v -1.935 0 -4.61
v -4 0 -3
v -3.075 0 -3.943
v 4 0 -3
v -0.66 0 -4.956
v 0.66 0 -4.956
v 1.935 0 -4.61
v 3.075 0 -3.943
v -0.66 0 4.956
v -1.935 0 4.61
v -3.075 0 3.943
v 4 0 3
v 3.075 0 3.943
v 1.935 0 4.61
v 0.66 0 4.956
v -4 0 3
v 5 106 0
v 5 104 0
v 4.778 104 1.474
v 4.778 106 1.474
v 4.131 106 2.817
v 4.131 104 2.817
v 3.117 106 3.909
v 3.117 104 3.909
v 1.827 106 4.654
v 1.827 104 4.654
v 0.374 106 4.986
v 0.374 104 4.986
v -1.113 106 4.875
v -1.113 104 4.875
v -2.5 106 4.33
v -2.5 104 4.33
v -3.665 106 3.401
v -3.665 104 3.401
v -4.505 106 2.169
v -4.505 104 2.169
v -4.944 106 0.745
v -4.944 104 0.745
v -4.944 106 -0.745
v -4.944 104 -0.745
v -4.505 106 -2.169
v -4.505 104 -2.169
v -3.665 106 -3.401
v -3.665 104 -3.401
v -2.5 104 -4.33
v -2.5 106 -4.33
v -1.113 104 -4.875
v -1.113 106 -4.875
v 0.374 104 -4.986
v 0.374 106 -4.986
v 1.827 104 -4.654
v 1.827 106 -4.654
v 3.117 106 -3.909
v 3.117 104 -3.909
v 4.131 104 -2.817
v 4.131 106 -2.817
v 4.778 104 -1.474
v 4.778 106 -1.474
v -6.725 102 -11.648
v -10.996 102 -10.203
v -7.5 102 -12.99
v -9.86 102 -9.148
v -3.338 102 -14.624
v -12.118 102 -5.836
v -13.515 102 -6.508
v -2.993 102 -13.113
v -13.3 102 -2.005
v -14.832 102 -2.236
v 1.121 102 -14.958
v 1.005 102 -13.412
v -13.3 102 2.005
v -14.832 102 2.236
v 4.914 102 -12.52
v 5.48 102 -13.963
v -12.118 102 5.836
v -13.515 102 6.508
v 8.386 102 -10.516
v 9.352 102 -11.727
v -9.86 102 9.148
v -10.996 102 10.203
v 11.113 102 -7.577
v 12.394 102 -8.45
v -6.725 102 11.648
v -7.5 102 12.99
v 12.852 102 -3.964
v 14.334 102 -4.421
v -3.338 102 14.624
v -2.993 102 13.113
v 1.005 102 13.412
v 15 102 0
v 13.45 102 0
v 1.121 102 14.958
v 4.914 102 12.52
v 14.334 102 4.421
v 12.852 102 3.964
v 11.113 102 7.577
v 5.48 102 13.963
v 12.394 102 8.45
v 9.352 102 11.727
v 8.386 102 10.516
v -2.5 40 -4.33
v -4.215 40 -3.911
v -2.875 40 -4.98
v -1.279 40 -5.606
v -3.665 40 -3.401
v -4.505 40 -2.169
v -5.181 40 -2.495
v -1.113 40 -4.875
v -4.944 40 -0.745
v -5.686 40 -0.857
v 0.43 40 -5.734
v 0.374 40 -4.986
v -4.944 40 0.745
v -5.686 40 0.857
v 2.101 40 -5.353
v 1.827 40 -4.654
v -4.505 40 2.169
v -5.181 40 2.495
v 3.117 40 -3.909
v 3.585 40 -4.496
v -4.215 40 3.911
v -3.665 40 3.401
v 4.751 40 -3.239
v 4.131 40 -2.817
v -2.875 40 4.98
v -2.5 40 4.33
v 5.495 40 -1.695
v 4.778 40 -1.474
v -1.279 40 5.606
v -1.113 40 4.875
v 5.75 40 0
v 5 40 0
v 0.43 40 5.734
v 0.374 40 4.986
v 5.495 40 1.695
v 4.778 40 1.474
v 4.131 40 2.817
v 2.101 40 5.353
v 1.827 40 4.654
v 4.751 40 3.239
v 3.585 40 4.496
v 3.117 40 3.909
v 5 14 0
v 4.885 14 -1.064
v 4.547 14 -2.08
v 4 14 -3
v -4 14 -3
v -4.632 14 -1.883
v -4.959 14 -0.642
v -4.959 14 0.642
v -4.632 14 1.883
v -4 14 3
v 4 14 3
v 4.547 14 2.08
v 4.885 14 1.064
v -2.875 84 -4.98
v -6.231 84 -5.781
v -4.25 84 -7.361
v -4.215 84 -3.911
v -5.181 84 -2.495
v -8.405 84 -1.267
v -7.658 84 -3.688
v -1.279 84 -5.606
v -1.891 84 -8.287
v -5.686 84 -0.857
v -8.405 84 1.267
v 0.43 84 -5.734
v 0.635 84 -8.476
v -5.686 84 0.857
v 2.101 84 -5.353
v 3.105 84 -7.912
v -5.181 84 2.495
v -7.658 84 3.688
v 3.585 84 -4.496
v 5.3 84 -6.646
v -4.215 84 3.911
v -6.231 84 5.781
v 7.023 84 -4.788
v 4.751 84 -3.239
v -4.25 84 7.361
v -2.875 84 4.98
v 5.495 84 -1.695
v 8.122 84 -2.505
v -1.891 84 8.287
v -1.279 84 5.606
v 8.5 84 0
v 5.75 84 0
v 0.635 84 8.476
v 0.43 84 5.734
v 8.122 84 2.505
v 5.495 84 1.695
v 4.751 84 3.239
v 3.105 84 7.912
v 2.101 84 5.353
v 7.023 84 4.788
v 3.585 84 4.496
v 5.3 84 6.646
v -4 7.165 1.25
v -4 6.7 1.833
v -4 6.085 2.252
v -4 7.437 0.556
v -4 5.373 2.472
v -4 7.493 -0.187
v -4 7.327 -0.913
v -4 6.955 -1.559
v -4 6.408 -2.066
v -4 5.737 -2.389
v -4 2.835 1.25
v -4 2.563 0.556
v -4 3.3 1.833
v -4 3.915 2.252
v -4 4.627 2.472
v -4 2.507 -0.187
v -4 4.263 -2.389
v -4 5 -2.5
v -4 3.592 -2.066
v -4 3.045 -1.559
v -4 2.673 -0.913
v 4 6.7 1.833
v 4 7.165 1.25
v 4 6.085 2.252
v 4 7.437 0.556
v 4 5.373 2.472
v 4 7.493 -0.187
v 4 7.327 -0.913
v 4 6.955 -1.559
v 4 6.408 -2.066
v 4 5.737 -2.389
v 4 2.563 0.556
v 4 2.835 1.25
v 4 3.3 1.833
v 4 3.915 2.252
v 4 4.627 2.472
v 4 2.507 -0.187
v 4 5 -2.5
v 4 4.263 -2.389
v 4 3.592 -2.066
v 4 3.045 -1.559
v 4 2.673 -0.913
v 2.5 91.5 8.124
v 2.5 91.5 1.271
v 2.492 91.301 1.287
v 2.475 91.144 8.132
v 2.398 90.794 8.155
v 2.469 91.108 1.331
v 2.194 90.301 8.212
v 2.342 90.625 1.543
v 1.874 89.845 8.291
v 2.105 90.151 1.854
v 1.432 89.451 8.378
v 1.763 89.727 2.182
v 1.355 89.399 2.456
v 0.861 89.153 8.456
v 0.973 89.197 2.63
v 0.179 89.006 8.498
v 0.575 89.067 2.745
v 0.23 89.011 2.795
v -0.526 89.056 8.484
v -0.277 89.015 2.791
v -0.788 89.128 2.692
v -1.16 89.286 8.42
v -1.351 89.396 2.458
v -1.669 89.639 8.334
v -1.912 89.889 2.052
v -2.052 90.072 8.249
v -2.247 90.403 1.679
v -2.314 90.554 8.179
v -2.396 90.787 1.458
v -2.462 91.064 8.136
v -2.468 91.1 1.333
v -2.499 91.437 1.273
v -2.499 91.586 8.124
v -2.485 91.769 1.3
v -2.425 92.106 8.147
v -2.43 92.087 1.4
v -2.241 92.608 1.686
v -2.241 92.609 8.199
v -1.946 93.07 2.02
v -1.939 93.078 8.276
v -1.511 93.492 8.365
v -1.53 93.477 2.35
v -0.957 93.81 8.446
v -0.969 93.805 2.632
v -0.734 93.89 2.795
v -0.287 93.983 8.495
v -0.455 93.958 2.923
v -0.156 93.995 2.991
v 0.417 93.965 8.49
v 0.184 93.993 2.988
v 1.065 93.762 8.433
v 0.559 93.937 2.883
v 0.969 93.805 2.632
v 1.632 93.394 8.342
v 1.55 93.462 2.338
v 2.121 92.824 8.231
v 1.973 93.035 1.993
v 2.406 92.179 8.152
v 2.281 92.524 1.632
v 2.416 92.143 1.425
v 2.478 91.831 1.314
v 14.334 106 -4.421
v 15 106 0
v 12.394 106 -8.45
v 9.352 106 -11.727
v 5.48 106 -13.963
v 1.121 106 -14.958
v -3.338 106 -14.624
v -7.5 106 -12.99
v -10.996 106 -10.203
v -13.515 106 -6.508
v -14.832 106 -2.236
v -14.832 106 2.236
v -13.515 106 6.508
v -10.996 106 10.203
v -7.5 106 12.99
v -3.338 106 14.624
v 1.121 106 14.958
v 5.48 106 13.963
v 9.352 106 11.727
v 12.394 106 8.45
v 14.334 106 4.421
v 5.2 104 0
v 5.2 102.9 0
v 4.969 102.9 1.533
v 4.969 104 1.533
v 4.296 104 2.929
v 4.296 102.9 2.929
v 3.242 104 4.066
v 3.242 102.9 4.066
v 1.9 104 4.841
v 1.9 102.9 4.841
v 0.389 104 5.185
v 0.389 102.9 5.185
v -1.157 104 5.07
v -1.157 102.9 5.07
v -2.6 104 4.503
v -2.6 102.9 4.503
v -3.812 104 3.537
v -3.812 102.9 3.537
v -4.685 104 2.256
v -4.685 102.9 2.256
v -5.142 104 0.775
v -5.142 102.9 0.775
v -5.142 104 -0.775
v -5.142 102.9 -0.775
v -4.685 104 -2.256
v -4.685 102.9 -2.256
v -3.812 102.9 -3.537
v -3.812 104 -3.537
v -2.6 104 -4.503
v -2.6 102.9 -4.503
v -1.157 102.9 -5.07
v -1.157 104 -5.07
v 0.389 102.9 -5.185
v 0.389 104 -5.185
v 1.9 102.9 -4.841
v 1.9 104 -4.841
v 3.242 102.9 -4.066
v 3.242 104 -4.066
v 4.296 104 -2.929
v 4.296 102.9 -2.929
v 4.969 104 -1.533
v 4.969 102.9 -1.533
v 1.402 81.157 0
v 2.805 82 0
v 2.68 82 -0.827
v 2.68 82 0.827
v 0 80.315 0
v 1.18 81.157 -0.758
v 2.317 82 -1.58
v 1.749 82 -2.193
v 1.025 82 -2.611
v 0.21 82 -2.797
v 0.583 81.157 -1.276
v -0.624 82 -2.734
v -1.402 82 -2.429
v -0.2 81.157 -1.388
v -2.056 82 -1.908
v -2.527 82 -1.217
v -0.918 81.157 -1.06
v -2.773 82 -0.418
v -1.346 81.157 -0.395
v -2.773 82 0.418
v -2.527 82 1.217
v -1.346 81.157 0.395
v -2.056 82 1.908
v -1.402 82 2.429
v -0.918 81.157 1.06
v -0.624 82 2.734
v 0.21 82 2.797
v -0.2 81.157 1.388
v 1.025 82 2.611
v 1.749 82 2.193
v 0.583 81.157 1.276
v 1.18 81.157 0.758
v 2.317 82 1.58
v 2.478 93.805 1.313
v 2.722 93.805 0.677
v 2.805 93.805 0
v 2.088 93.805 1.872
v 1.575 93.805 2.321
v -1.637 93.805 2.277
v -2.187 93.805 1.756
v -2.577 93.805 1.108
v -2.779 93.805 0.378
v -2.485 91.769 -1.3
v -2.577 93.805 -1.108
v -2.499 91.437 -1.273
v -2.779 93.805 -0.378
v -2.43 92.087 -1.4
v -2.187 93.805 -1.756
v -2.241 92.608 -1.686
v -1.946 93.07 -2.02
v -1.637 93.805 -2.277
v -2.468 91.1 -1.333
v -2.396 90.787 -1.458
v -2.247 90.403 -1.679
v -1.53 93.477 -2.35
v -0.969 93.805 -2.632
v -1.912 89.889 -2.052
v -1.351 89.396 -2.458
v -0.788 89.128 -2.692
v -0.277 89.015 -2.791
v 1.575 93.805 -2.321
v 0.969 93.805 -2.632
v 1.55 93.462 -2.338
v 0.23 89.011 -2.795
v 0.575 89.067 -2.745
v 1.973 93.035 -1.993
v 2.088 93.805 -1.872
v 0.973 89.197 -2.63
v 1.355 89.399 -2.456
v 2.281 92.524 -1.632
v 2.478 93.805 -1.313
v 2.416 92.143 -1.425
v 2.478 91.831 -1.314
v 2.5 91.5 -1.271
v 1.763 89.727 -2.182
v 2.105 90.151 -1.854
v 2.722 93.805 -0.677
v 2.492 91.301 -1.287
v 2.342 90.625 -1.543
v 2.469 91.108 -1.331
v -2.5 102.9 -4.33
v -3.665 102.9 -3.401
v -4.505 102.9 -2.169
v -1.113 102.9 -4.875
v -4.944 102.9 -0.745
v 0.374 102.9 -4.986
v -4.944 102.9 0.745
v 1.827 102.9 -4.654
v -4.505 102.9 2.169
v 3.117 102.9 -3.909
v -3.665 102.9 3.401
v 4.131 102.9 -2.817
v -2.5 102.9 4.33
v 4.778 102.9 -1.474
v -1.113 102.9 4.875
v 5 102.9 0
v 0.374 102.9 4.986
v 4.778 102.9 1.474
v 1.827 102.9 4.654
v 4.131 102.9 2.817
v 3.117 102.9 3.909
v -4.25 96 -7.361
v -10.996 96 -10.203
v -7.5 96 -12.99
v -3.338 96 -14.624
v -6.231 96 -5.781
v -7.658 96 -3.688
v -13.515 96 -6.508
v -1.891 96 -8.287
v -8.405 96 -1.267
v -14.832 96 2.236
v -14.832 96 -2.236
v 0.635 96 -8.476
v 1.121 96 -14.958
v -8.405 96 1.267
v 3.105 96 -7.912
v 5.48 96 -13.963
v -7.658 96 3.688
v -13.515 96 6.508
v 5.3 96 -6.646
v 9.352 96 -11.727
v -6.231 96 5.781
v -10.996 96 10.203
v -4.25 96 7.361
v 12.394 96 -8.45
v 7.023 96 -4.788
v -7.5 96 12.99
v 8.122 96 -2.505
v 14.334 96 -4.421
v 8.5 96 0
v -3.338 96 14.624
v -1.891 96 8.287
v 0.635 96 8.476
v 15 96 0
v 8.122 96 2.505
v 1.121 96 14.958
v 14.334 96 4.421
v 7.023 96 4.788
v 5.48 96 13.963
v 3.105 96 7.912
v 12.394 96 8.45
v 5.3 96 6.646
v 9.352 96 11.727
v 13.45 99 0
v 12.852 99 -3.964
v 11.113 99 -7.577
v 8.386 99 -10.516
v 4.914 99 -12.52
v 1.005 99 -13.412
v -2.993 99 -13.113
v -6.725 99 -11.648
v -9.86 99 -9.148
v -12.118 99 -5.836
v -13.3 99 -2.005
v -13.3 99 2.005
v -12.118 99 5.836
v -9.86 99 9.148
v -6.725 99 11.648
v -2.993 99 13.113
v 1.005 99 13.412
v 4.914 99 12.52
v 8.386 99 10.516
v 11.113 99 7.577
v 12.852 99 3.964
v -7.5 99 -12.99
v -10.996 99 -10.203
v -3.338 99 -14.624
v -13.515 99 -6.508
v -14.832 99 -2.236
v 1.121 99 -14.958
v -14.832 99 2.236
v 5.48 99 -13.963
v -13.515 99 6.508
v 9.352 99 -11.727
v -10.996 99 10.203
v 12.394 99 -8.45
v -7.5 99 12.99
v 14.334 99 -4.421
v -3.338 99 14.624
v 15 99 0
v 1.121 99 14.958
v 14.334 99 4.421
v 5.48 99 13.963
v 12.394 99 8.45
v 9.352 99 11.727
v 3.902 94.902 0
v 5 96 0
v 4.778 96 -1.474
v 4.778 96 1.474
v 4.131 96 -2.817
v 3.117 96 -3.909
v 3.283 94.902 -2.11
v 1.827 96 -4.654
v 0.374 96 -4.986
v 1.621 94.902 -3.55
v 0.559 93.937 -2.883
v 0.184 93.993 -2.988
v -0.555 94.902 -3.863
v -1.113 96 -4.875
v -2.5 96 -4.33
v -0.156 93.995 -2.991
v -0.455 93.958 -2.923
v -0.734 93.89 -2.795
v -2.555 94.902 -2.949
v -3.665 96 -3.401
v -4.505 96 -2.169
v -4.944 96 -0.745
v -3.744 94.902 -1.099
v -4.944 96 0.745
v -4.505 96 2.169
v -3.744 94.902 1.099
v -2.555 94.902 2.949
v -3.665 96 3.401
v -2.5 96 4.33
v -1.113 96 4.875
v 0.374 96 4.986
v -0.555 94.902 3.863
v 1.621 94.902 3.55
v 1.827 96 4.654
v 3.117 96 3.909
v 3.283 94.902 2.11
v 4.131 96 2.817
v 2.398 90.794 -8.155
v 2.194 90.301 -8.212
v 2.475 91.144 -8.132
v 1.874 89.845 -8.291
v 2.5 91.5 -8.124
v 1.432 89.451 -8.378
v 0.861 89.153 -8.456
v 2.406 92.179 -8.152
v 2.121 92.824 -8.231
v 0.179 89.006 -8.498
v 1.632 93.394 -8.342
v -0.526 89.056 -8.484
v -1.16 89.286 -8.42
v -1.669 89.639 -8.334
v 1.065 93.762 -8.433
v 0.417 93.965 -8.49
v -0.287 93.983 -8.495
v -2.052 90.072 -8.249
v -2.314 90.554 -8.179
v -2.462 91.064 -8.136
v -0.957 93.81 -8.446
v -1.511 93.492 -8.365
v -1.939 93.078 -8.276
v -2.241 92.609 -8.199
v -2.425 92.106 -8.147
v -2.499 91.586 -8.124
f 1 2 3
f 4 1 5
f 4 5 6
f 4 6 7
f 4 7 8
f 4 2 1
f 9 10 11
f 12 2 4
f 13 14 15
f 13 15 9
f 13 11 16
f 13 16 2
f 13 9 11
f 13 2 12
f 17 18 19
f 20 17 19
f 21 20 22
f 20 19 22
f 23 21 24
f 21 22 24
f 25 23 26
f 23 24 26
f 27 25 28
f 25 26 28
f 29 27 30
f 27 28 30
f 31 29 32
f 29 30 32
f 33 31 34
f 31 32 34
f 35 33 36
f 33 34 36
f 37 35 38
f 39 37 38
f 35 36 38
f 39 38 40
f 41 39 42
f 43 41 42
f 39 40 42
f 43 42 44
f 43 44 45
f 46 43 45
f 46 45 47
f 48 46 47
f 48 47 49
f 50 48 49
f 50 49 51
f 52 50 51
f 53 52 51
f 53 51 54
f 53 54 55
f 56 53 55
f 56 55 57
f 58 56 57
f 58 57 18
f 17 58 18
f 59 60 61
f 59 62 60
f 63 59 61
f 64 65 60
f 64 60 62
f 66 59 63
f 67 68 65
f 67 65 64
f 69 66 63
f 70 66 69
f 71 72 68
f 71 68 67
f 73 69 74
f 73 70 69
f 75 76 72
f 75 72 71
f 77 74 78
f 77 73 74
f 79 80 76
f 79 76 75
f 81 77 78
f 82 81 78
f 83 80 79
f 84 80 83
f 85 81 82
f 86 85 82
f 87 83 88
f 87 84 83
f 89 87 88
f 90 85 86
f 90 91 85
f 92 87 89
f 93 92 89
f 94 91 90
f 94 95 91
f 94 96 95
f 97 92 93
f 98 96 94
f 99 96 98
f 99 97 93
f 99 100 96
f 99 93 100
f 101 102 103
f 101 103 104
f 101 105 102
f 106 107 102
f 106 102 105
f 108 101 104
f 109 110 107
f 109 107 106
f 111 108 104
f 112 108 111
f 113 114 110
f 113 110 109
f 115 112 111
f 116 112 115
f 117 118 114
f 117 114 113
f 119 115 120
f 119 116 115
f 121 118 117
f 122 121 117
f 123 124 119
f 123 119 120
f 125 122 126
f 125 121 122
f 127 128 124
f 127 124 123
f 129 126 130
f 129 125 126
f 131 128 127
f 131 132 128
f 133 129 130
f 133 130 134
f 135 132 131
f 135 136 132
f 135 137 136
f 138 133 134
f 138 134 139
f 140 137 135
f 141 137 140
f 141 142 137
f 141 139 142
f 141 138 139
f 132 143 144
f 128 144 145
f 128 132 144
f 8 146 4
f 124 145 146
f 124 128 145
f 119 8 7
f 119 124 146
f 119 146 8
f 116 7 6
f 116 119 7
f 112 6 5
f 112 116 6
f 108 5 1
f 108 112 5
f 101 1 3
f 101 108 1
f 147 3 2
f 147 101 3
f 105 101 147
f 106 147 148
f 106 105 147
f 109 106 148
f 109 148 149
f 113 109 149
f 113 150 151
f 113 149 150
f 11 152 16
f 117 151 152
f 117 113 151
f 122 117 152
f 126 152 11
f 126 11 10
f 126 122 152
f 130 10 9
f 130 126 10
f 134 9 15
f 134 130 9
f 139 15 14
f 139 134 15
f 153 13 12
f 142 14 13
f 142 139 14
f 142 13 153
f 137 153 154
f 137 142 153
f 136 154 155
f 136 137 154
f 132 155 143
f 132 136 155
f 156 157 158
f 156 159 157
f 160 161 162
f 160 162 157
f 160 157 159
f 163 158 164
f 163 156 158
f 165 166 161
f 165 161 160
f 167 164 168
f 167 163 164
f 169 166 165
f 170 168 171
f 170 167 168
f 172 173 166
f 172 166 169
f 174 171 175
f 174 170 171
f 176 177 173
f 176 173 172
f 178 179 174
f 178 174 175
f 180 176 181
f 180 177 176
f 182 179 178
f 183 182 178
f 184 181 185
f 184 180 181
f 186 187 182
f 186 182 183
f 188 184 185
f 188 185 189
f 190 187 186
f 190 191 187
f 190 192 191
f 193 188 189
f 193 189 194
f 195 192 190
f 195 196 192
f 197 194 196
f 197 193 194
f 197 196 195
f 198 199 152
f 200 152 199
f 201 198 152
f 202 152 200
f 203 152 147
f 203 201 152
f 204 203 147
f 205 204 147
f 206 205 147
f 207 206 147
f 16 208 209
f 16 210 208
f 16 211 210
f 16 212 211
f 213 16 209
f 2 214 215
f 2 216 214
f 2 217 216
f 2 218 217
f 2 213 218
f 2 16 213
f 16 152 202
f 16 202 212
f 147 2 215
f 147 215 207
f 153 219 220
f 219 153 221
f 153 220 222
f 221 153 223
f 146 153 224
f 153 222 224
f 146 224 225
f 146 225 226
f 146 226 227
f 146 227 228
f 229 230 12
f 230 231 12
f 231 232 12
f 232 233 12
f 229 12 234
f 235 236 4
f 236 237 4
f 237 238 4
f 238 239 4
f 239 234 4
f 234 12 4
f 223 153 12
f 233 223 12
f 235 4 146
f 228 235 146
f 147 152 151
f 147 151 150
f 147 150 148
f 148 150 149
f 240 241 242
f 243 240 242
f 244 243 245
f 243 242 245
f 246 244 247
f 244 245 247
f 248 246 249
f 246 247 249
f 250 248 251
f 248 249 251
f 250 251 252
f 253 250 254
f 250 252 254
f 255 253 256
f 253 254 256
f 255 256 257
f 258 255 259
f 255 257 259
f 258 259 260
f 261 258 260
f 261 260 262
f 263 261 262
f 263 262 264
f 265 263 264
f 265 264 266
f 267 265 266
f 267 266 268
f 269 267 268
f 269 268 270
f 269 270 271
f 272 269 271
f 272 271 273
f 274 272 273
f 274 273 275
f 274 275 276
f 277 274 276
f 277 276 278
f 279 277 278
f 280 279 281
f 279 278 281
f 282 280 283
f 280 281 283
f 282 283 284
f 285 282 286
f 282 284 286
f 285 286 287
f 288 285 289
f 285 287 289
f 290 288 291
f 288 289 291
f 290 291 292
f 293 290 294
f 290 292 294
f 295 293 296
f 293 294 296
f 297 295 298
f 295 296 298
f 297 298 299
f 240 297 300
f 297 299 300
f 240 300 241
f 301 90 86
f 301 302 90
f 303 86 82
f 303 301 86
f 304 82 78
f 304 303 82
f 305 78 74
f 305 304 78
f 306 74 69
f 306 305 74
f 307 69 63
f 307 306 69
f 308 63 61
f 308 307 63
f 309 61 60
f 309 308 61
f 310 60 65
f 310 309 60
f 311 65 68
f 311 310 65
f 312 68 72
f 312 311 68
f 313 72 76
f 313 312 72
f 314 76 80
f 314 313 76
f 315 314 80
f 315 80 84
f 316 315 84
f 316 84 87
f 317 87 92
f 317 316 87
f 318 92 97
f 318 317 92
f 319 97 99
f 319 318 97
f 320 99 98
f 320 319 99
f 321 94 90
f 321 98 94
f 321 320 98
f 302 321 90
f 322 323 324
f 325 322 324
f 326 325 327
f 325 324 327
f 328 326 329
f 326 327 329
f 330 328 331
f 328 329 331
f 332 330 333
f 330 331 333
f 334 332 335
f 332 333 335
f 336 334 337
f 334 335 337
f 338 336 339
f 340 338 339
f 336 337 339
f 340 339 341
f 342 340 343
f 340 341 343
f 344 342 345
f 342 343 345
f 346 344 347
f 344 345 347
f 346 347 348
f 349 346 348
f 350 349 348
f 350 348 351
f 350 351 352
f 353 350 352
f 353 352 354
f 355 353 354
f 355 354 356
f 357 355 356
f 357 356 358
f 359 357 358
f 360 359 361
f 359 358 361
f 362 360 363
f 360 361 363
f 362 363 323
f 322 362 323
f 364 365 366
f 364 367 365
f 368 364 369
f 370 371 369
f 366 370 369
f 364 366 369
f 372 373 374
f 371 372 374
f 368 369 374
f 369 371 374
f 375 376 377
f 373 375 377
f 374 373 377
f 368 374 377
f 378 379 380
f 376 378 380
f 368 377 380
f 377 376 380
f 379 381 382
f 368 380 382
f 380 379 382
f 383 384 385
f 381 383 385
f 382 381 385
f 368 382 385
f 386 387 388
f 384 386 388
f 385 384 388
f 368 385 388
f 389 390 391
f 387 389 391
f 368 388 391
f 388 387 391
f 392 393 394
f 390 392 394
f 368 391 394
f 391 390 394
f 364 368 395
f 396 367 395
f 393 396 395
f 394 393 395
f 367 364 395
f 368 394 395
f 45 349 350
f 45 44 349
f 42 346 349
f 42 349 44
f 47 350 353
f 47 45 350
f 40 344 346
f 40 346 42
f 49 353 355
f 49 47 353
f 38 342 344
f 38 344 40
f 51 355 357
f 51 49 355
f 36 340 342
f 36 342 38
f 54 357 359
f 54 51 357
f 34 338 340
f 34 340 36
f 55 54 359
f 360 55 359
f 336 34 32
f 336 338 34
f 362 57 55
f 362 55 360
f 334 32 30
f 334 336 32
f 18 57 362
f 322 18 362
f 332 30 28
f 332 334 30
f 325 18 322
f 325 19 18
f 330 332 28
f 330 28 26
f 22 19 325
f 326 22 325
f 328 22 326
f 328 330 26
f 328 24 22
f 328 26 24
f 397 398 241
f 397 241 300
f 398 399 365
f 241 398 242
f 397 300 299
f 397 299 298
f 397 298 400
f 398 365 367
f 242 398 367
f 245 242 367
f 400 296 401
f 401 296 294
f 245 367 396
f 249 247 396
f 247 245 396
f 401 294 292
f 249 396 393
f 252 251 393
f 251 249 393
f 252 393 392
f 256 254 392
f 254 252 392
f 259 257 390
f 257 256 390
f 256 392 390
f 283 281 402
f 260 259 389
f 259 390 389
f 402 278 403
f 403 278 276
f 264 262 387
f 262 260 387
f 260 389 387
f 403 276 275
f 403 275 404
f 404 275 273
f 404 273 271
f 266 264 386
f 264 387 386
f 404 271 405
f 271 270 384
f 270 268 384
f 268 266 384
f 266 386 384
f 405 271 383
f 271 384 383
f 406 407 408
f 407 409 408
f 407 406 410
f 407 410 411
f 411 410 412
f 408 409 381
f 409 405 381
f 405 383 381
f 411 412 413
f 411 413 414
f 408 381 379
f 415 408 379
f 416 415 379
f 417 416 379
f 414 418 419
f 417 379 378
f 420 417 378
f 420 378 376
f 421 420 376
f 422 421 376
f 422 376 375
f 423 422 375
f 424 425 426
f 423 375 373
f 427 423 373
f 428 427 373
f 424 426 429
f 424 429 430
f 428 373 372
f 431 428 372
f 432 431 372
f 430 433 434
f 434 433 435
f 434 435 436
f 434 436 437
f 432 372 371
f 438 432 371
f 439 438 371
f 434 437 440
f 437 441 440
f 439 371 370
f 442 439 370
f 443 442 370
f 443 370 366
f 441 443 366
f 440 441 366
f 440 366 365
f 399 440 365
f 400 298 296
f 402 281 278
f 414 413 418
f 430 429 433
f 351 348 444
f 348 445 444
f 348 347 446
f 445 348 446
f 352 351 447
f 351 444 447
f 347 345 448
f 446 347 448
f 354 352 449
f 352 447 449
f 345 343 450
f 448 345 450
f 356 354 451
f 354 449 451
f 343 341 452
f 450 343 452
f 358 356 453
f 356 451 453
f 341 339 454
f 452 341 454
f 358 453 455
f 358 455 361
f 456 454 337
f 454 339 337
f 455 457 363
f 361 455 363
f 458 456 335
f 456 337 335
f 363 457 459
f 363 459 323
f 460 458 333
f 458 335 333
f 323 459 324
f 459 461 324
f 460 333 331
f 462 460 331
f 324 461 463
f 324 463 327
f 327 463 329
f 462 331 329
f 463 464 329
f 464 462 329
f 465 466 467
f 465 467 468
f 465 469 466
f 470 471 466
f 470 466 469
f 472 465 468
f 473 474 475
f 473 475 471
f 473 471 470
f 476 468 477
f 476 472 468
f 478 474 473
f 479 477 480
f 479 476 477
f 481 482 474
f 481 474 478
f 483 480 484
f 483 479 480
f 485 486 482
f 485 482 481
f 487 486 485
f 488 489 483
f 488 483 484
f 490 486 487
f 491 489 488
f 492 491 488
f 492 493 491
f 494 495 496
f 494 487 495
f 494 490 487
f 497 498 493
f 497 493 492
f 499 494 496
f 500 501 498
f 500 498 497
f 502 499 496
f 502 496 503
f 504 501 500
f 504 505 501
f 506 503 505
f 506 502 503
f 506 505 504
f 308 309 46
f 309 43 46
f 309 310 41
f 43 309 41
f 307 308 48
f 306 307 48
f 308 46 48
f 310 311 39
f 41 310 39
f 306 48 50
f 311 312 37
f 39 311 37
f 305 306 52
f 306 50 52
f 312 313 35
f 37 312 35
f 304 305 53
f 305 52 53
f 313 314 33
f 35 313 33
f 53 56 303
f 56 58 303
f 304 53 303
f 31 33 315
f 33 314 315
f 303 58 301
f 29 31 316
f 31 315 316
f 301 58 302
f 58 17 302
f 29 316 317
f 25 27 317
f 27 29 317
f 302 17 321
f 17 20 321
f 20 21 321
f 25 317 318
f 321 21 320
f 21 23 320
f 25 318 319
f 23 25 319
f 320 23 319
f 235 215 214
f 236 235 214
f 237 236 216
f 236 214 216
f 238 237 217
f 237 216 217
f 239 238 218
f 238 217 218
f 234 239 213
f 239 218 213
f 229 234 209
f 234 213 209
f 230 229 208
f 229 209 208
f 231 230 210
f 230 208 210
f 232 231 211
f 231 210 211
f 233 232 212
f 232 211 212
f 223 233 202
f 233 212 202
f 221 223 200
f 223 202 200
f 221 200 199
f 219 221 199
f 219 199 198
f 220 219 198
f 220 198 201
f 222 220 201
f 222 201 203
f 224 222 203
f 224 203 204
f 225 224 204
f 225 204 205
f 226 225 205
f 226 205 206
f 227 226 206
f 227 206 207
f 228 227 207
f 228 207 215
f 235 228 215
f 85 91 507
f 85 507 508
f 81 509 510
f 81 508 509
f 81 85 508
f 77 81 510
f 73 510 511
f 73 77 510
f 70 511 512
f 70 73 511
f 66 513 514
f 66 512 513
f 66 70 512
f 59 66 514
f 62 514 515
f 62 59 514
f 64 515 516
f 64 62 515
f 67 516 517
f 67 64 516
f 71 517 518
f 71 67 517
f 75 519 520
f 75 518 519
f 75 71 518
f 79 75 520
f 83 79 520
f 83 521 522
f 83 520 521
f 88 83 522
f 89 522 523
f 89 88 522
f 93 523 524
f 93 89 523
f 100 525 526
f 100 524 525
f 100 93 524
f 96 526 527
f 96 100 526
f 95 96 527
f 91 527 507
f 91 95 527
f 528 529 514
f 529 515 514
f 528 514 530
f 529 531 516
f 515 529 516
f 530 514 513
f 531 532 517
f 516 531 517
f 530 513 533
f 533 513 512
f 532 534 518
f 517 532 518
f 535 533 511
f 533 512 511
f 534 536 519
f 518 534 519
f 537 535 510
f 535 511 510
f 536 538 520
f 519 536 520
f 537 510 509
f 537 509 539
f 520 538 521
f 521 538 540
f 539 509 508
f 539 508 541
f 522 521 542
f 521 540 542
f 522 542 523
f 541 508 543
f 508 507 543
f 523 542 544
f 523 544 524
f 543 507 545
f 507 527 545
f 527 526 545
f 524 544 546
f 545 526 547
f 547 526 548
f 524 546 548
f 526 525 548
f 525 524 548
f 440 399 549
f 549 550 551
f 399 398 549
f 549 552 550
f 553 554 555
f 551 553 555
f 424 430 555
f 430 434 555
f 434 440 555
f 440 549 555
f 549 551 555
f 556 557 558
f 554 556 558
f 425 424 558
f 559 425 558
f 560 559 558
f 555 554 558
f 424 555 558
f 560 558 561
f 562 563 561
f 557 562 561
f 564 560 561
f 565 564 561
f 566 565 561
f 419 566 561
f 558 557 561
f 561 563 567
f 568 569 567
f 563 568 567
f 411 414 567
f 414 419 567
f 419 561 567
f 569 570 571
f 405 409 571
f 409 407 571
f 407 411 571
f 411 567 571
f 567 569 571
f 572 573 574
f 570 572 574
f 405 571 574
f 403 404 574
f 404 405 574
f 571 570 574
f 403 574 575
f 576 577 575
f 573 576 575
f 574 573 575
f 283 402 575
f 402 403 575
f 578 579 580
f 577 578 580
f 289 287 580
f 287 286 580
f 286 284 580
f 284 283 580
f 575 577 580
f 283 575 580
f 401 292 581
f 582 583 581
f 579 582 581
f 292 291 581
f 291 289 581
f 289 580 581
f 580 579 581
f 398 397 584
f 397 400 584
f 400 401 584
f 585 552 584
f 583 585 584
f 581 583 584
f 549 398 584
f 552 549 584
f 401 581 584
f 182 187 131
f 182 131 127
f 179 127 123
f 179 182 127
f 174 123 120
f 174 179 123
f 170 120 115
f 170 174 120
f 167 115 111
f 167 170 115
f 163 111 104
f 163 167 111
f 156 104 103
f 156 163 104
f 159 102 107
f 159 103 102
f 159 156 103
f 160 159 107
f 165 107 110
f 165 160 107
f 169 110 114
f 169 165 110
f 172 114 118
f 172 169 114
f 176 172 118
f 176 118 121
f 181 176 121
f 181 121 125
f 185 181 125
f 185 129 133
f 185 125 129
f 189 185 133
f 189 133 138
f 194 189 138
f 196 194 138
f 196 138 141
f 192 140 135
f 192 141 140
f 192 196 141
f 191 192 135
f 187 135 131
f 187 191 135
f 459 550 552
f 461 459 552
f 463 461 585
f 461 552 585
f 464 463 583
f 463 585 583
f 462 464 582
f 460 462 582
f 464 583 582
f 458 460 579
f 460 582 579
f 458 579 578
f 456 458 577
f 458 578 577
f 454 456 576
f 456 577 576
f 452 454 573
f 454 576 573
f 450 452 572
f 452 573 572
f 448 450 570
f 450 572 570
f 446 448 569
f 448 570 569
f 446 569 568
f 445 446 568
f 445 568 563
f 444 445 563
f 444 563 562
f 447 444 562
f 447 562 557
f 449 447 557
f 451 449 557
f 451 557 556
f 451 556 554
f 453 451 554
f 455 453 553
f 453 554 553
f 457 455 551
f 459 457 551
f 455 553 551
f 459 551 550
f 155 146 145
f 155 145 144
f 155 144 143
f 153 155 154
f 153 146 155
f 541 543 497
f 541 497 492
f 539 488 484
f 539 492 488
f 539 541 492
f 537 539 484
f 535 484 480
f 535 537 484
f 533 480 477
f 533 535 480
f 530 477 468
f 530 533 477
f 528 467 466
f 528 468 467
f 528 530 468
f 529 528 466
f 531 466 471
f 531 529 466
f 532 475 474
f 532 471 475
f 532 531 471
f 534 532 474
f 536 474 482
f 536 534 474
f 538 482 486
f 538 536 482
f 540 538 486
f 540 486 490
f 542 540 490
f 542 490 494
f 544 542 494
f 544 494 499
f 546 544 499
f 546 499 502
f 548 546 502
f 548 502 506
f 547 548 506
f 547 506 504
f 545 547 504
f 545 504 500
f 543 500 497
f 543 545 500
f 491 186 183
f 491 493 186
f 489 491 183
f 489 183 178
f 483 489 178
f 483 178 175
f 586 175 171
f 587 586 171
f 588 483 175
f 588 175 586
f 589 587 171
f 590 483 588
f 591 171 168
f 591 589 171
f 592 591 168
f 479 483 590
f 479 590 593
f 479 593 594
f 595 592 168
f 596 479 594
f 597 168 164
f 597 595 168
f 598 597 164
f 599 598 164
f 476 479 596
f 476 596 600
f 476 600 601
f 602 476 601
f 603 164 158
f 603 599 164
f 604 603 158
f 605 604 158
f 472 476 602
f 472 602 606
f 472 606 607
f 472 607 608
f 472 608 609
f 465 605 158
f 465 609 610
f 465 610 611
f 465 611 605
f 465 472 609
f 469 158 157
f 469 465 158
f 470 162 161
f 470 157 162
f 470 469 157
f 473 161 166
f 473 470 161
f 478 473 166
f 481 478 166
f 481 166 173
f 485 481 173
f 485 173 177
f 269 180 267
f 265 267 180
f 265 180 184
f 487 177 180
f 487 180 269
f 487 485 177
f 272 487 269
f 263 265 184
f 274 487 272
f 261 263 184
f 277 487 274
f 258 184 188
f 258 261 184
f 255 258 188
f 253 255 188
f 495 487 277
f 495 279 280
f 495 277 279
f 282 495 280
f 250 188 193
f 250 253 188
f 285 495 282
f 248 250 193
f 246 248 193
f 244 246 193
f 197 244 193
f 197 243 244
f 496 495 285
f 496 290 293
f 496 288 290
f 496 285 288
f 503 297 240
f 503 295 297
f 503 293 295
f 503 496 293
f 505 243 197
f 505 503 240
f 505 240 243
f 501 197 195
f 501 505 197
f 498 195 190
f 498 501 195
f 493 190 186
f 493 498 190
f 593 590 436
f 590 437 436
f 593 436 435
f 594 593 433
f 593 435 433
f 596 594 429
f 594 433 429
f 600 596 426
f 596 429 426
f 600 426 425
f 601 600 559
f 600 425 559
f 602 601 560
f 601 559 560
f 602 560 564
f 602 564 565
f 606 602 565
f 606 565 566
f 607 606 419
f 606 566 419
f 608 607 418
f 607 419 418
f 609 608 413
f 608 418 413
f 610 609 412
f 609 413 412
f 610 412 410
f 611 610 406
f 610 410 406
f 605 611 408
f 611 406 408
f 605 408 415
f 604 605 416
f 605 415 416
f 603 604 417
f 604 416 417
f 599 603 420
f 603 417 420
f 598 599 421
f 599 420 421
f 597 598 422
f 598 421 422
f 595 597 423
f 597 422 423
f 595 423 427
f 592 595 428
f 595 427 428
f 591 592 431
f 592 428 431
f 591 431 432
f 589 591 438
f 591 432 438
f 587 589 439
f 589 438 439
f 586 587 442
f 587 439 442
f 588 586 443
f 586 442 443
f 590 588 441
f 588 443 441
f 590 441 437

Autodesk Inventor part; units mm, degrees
ref_plane "YZ Plane" through (0, 0, 0) normal (1, 0, 0) x (0, 1, 0)
ref_plane "XZ Plane" through (0, 0, 0) normal (0, 1, 0) x (-1, 0, 0)
ref_plane "XY Plane" through (0, 0, 0) normal (0, 0, 1) x (1, 0, 0)
sketch "Schizzo1" plane through (0, 0, 0) normal (0, 0, 1) x (1, 0, 0)
  line L0 (0, 0) -> (5, 0)
  line L1 (5, 0) -> (5, 40)
  line L2 (5, 40) -> (5.75, 40)
  line L3 (5.75, 40) -> (5.75, 84)
  line L4 (5.75, 84) -> (8.5, 84)
  line L5 (8.5, 84) -> (8.5, 96)
  line L6 (8.5, 96) -> (15, 96)
  line L7 (15, 96) -> (15, 99)
  line L8 (15, 99) -> (13.45, 99)
  line L9 (13.45, 99) -> (13.45, 102)
  line L10 (13.45, 102) -> (15, 102)
  line L11 (15, 102) -> (15, 106)
  line L12 (15, 106) -> (5, 106)
  line L13 (5, 106) -> (5, 104)
  line L14 (5, 104) -> (5.2, 104)
  line L15 (5.2, 104) -> (5.2, 102.9)
  line L16 (5.2, 102.9) -> (5, 102.9)
  line L17 (5, 102.9) -> (5, 96)
  line L18 (5, 96) -> (2.8047, 93.8047)
  line L19 (2.8047, 93.8047) -> (2.8047, 82)
  line L20 (2.8047, 82) -> (0, 80.3148)
  line L21 (0, 80.3148) -> (0, 0)
  dimension "d1" = 10
  dimension "d2" = 11.5
  dimension "d3" = 30
  dimension "d4" = 26.9
  dimension "d5" = 10.4
  dimension "d6" = 10
  dimension "d7" = 5.6094
  dimension "d8" = 17
  dimension "d9" = 40
  dimension "d10" = 84
  dimension "d11" = 96
  dimension "d12" = 10
  dimension "d13" = 4
  dimension "d14" = 3
  dimension "d15" = 2
  dimension "d16" = 1.1
  dimension "d17" = 45
  dimension "d18" = 59
  dimension "d19" = 24
revolve "Rivoluzione1" add sketch "Schizzo1" angle 360 about axis through (0, 80.3148, 0) along (0, -1, 0)
sketch "Schizzo2" plane through (0, 0, 0) normal (0, 0, 1) x (1, 0, 0)
  circle A0 centre (0, 91.5) radius 2.5
  line L0 (-15, 96) -> (15, 96) projected
  point P0 (0, 0)
  dimension "d21" = 5
  dimension "d22" = 4.5
extrude "Estrusione1" cut sketch "Schizzo2" along normal mid plane 30
sketch "Schizzo3" plane through (0, 0, 0) normal (0, -1, 0) x (1, 0, 0)
  line L0 (-4, 3) -> (-4, -3)
  line L1 (4, 3) -> (4, -3)
  circle A0 centre (0, 0) radius 5 projected
  dimension "d25" = 1
extrude "Estrusione2" cut sketch "Schizzo3" against normal blind 14 contours L0 A0 | A0 L1
sketch "Schizzo4" plane through (4, 0, 3) normal (1, 0, 0) x (0, 0, -1)
  line L0 (6, 0) -> (0, 0) projected
  point P0 (3, 0)
  point P1 (3, 5)
  point P2 (3, 0)
  dimension "d30" = 5
hole "Foro1" at (4, 5, 0) direction (-1, 0, 0) diameter 5 end through all
properties part number "04-03-2023"
